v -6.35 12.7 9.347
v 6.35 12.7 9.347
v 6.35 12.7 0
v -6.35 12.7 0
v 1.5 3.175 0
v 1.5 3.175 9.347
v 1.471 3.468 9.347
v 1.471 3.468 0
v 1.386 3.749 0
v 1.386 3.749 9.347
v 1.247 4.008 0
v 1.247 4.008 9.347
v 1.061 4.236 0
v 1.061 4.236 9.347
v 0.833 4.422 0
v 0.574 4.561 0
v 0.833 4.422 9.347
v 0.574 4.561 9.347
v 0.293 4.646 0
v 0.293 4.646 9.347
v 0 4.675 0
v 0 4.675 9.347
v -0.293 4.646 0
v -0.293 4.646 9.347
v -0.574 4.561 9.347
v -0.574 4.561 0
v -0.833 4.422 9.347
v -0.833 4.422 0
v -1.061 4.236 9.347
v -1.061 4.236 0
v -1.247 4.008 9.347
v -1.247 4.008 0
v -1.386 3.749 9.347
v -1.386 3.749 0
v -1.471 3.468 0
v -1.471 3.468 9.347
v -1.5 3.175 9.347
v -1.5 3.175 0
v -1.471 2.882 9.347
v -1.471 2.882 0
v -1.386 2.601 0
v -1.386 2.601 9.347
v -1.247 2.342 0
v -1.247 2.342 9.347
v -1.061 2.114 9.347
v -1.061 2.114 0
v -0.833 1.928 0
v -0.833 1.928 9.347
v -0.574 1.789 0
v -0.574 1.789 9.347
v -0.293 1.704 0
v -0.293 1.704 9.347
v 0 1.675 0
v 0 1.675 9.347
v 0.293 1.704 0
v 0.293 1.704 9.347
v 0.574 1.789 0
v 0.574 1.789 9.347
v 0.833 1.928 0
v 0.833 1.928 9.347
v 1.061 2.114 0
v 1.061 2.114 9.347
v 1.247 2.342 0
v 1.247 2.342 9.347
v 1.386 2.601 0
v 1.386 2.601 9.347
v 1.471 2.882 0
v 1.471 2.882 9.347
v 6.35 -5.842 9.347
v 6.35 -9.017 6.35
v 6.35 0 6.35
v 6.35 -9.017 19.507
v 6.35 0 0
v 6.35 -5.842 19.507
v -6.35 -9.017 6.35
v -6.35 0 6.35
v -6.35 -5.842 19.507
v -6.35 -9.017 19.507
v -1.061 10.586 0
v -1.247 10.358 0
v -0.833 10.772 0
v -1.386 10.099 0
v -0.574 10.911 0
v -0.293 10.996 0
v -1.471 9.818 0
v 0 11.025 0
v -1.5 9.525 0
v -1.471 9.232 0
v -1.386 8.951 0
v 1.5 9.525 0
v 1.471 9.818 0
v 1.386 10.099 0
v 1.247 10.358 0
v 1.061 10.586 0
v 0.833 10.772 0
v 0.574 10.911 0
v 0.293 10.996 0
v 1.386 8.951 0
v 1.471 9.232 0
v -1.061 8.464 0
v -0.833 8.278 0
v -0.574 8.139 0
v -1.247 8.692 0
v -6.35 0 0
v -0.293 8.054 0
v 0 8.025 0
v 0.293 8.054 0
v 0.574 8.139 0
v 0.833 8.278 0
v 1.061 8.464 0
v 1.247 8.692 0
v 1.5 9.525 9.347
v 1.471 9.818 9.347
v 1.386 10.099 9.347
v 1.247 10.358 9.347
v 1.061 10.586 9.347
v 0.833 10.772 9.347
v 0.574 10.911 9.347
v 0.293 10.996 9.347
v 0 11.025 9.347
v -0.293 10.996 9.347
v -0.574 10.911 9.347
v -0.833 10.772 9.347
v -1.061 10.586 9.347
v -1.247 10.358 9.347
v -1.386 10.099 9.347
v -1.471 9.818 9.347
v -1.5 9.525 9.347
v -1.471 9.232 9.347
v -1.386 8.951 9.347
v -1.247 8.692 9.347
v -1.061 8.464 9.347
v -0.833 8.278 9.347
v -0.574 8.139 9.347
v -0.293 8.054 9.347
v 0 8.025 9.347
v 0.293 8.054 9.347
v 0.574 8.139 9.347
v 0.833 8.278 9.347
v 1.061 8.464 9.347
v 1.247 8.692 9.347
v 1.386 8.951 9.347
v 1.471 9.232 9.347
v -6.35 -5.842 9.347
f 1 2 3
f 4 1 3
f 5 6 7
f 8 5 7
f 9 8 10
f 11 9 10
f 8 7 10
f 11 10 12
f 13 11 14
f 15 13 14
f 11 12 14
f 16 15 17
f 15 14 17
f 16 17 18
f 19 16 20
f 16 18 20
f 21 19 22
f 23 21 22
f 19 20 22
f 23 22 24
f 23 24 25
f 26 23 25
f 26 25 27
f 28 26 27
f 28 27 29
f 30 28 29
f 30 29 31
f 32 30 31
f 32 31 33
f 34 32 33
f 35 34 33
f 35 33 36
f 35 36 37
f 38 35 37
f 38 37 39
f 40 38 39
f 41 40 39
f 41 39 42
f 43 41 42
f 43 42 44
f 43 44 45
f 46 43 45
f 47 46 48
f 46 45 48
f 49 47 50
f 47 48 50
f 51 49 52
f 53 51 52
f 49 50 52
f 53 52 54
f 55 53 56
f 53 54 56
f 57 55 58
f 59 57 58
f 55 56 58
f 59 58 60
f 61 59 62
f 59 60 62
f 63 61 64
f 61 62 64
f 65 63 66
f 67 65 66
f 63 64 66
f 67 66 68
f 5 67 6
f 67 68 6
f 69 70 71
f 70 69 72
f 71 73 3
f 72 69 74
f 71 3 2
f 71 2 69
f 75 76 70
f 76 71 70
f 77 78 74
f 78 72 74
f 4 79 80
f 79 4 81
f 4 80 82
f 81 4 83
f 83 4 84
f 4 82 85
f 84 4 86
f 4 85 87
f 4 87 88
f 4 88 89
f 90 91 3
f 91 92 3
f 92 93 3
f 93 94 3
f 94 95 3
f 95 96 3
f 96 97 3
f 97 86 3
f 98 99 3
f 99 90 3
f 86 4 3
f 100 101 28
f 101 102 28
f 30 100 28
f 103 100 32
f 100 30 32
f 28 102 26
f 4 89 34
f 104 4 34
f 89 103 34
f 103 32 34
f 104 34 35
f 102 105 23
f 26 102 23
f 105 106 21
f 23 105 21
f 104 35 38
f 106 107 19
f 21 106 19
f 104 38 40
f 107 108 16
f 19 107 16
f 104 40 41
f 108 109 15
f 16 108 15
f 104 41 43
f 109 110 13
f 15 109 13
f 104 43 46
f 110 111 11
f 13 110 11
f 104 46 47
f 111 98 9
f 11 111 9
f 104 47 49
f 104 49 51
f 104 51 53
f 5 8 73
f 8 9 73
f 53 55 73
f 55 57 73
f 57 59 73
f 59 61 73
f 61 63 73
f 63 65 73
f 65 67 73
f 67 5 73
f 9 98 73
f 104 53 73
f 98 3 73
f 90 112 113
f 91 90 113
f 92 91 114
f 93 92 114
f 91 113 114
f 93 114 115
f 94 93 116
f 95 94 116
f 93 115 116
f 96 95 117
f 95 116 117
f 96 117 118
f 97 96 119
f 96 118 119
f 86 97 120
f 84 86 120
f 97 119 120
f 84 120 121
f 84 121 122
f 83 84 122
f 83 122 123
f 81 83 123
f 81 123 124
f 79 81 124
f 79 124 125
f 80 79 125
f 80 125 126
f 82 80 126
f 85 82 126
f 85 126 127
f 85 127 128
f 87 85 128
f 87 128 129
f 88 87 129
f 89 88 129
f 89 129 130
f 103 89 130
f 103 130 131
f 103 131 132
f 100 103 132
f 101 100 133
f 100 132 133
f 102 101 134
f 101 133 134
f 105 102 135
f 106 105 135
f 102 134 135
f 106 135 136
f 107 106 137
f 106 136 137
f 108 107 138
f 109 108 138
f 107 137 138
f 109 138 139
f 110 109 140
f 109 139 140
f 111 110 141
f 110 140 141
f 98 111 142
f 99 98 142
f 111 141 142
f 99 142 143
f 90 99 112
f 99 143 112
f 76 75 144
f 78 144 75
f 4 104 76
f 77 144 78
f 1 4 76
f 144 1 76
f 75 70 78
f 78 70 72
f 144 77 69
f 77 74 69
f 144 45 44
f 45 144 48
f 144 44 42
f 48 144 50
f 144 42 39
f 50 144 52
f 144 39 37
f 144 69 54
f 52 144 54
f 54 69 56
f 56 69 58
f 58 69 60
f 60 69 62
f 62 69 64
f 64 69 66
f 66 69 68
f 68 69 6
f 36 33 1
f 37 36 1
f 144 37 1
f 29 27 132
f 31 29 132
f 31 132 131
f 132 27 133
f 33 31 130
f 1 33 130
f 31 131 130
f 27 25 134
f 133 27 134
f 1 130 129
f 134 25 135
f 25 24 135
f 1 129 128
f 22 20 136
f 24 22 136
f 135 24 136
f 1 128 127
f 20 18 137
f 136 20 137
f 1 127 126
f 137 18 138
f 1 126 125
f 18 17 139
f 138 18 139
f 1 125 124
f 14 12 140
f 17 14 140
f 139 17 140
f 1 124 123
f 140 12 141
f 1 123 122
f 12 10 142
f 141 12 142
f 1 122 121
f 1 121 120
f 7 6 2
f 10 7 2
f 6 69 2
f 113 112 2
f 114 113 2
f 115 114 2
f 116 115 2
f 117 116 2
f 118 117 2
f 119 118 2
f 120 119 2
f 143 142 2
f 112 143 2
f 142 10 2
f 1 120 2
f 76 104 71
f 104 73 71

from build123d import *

# Parameters (mm, degrees)
BOSS_EXTRUDE1_DEPTH = 6.35
SKETCH2_R           = 1.5
CUT_EXTRUDE1_DEPTH  = 10.3472


with BuildPart() as part:
    # Sketch1 → Boss-Extrude1 (new body, symmetric)
    with BuildSketch(Plane(origin=(0, 0, 0), x_dir=(0, 0, -1), z_dir=(1, 0, 0))):
        Polygon((0, 12.7), (0, 0), (-6.35, 0), (-6.35, -9.017), (-19.5072, -9.017), (-19.5072, -5.842), (-9.3472, -5.842), (-9.3472, 12.7), align=None)
    extrude(amount=BOSS_EXTRUDE1_DEPTH, both=True)

    # Sketch2 → Cut-Extrude1 (cut, through all)
    with BuildSketch(Plane.XY.offset(9.3472)):
        with Locations((0, 9.525)):
            Circle(SKETCH2_R)
        with Locations((0, 3.175)):
            Circle(SKETCH2_R)
    extrude(amount=-CUT_EXTRUDE1_DEPTH, mode=Mode.SUBTRACT)


solid = part.part
